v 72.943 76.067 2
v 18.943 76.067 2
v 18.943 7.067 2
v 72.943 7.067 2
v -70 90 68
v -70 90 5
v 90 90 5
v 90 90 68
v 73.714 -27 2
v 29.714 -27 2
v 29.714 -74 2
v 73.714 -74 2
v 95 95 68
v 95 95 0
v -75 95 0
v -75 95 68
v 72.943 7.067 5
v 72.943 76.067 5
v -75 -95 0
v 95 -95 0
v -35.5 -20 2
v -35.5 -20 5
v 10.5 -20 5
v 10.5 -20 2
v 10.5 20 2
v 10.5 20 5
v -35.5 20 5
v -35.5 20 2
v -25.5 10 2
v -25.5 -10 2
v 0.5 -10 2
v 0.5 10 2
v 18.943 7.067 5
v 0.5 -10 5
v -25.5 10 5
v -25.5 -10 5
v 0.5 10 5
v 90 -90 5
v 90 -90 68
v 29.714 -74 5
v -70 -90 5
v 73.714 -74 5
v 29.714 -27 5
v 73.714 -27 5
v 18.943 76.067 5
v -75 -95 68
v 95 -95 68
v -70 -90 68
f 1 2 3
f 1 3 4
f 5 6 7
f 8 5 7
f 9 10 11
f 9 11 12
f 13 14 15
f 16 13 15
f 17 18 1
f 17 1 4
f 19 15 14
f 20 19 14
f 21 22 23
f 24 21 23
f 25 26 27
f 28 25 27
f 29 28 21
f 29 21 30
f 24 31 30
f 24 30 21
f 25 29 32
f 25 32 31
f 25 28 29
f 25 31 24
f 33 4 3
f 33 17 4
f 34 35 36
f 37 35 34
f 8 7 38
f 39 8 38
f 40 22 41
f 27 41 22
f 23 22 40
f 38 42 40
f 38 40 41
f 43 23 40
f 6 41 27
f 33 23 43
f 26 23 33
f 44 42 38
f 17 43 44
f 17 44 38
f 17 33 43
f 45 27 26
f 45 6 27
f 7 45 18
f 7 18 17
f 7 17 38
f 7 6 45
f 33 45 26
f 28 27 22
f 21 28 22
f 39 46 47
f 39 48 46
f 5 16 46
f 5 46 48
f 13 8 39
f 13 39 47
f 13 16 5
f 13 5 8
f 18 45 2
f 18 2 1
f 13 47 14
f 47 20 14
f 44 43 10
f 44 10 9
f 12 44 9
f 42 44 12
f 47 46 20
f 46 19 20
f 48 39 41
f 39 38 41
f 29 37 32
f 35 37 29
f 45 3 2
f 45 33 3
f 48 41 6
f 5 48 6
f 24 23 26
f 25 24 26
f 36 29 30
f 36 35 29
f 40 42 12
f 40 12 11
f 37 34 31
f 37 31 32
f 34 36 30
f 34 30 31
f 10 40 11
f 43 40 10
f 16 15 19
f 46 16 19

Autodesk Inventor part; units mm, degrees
ref_plane "YZ Plane" through (0, 0, 0) normal (1, 0, 0) x (0, 1, 0)
ref_plane "XZ Plane" through (0, 0, 0) normal (0, 1, 0) x (-1, 0, 0)
ref_plane "XY Plane" through (0, 0, 0) normal (0, 0, 1) x (1, 0, 0)
sketch "Sketch1" plane through (0, 0, 0) normal (0, 0, 1) x (1, 0, 0)
  line L0 (90, -90) -> (-70, -90)
  line L1 (-70, -90) -> (-70, 90)
  line L2 (-70, 90) -> (90, 90)
  line L3 (90, 90) -> (90, -90)
  line L4 (95, 95) -> (-75, 95)
  line L5 (-75, 95) -> (-75, -95)
  line L6 (-75, -95) -> (95, -95)
  line L7 (95, -95) -> (95, 95)
  point P0 (0, 0)
  dimension "d45" = 180
  dimension "d46" = 5
  dimension "d61" = 70
  dimension "d62" = 90
  dimension "d63" = 5
extrude "Extrusion1" add sketch "Sketch1" along normal blind 68
extrude "Extrusion2" add sketch "Sketch1" along normal blind 5 contours L0 L1 L2 L3
sketch "Sketch2" plane through (0, 0, 5) normal (0, 0, 1) x (1, 0, 0)
  line L0 (29.7141, -27.0003) -> (73.7141, -27.0003)
  line L1 (73.7141, -27.0003) -> (73.7141, -74.0003)
  line L2 (73.7141, -74.0003) -> (29.7141, -74.0003)
  line L3 (29.7141, -74.0003) -> (29.7141, -27.0003)
  circle A0 centre (0, 0) radius 150 construction
  line L4 (72.9434, 76.0673) -> (72.9434, 7.0673)
  line L5 (72.9434, 7.0673) -> (18.9434, 7.0673)
  line L6 (18.9434, 7.0673) -> (18.9434, 76.0673)
  line L7 (18.9434, 76.0673) -> (72.9434, 76.0673)
  line L8 (45.9434, 76.0673) -> (45.9434, 7.0673) construction
  line L9 (-70, -90) -> (90, -90)
  line L10 (90, -90) -> (90, 90)
  line L11 (90, 90) -> (-70, 90)
  line L12 (-70, 90) -> (-70, -90)
  line L13 (90, 90) -> (90, -90) projected
  line L14 (-25.5, -10) -> (0.5, -10)
  line L15 (0.5, -10) -> (0.5, 10)
  line L16 (0.5, 10) -> (-25.5, 10)
  line L17 (-25.5, 10) -> (-25.5, -10)
  line L18 (-35.5, -20) -> (10.5, -20)
  line L19 (10.5, -20) -> (10.5, 20)
  line L20 (10.5, 20) -> (-35.5, 20)
  line L21 (-35.5, 20) -> (-35.5, -20)
  point P0 (51.7141, -50.5003)
  point P1 (73.7141, -50.5003)
  point P2 (51.7141, -27.0003)
  point P3 (45.9434, 41.5673)
  dimension "d6" = 47
  dimension "d7" = 44
  dimension "d8" = 54
  dimension "d9" = 69
  dimension "d47" = 160
  dimension "d48" = 160
  dimension "d54" = 26
  dimension "d55" = 20
  dimension "d56" = 46
  dimension "d57" = 40
  dimension "d58" = 0.5
  dimension "d59" = 10
  dimension "d60" = 10
extrude "Extrusion3" cut sketch "Sketch2" against normal blind 1.5 contours L0 L1 L2 L3 | L4 L5 L6 L7
extrude "Extrusion4" cut sketch "Sketch2" against normal blind 3 contours L0 L1 L2 L3 | L4 L5 L6 L7 | L21 L20 L19 L18
properties part number "Shooting Mechanism Box" material "Glass"
